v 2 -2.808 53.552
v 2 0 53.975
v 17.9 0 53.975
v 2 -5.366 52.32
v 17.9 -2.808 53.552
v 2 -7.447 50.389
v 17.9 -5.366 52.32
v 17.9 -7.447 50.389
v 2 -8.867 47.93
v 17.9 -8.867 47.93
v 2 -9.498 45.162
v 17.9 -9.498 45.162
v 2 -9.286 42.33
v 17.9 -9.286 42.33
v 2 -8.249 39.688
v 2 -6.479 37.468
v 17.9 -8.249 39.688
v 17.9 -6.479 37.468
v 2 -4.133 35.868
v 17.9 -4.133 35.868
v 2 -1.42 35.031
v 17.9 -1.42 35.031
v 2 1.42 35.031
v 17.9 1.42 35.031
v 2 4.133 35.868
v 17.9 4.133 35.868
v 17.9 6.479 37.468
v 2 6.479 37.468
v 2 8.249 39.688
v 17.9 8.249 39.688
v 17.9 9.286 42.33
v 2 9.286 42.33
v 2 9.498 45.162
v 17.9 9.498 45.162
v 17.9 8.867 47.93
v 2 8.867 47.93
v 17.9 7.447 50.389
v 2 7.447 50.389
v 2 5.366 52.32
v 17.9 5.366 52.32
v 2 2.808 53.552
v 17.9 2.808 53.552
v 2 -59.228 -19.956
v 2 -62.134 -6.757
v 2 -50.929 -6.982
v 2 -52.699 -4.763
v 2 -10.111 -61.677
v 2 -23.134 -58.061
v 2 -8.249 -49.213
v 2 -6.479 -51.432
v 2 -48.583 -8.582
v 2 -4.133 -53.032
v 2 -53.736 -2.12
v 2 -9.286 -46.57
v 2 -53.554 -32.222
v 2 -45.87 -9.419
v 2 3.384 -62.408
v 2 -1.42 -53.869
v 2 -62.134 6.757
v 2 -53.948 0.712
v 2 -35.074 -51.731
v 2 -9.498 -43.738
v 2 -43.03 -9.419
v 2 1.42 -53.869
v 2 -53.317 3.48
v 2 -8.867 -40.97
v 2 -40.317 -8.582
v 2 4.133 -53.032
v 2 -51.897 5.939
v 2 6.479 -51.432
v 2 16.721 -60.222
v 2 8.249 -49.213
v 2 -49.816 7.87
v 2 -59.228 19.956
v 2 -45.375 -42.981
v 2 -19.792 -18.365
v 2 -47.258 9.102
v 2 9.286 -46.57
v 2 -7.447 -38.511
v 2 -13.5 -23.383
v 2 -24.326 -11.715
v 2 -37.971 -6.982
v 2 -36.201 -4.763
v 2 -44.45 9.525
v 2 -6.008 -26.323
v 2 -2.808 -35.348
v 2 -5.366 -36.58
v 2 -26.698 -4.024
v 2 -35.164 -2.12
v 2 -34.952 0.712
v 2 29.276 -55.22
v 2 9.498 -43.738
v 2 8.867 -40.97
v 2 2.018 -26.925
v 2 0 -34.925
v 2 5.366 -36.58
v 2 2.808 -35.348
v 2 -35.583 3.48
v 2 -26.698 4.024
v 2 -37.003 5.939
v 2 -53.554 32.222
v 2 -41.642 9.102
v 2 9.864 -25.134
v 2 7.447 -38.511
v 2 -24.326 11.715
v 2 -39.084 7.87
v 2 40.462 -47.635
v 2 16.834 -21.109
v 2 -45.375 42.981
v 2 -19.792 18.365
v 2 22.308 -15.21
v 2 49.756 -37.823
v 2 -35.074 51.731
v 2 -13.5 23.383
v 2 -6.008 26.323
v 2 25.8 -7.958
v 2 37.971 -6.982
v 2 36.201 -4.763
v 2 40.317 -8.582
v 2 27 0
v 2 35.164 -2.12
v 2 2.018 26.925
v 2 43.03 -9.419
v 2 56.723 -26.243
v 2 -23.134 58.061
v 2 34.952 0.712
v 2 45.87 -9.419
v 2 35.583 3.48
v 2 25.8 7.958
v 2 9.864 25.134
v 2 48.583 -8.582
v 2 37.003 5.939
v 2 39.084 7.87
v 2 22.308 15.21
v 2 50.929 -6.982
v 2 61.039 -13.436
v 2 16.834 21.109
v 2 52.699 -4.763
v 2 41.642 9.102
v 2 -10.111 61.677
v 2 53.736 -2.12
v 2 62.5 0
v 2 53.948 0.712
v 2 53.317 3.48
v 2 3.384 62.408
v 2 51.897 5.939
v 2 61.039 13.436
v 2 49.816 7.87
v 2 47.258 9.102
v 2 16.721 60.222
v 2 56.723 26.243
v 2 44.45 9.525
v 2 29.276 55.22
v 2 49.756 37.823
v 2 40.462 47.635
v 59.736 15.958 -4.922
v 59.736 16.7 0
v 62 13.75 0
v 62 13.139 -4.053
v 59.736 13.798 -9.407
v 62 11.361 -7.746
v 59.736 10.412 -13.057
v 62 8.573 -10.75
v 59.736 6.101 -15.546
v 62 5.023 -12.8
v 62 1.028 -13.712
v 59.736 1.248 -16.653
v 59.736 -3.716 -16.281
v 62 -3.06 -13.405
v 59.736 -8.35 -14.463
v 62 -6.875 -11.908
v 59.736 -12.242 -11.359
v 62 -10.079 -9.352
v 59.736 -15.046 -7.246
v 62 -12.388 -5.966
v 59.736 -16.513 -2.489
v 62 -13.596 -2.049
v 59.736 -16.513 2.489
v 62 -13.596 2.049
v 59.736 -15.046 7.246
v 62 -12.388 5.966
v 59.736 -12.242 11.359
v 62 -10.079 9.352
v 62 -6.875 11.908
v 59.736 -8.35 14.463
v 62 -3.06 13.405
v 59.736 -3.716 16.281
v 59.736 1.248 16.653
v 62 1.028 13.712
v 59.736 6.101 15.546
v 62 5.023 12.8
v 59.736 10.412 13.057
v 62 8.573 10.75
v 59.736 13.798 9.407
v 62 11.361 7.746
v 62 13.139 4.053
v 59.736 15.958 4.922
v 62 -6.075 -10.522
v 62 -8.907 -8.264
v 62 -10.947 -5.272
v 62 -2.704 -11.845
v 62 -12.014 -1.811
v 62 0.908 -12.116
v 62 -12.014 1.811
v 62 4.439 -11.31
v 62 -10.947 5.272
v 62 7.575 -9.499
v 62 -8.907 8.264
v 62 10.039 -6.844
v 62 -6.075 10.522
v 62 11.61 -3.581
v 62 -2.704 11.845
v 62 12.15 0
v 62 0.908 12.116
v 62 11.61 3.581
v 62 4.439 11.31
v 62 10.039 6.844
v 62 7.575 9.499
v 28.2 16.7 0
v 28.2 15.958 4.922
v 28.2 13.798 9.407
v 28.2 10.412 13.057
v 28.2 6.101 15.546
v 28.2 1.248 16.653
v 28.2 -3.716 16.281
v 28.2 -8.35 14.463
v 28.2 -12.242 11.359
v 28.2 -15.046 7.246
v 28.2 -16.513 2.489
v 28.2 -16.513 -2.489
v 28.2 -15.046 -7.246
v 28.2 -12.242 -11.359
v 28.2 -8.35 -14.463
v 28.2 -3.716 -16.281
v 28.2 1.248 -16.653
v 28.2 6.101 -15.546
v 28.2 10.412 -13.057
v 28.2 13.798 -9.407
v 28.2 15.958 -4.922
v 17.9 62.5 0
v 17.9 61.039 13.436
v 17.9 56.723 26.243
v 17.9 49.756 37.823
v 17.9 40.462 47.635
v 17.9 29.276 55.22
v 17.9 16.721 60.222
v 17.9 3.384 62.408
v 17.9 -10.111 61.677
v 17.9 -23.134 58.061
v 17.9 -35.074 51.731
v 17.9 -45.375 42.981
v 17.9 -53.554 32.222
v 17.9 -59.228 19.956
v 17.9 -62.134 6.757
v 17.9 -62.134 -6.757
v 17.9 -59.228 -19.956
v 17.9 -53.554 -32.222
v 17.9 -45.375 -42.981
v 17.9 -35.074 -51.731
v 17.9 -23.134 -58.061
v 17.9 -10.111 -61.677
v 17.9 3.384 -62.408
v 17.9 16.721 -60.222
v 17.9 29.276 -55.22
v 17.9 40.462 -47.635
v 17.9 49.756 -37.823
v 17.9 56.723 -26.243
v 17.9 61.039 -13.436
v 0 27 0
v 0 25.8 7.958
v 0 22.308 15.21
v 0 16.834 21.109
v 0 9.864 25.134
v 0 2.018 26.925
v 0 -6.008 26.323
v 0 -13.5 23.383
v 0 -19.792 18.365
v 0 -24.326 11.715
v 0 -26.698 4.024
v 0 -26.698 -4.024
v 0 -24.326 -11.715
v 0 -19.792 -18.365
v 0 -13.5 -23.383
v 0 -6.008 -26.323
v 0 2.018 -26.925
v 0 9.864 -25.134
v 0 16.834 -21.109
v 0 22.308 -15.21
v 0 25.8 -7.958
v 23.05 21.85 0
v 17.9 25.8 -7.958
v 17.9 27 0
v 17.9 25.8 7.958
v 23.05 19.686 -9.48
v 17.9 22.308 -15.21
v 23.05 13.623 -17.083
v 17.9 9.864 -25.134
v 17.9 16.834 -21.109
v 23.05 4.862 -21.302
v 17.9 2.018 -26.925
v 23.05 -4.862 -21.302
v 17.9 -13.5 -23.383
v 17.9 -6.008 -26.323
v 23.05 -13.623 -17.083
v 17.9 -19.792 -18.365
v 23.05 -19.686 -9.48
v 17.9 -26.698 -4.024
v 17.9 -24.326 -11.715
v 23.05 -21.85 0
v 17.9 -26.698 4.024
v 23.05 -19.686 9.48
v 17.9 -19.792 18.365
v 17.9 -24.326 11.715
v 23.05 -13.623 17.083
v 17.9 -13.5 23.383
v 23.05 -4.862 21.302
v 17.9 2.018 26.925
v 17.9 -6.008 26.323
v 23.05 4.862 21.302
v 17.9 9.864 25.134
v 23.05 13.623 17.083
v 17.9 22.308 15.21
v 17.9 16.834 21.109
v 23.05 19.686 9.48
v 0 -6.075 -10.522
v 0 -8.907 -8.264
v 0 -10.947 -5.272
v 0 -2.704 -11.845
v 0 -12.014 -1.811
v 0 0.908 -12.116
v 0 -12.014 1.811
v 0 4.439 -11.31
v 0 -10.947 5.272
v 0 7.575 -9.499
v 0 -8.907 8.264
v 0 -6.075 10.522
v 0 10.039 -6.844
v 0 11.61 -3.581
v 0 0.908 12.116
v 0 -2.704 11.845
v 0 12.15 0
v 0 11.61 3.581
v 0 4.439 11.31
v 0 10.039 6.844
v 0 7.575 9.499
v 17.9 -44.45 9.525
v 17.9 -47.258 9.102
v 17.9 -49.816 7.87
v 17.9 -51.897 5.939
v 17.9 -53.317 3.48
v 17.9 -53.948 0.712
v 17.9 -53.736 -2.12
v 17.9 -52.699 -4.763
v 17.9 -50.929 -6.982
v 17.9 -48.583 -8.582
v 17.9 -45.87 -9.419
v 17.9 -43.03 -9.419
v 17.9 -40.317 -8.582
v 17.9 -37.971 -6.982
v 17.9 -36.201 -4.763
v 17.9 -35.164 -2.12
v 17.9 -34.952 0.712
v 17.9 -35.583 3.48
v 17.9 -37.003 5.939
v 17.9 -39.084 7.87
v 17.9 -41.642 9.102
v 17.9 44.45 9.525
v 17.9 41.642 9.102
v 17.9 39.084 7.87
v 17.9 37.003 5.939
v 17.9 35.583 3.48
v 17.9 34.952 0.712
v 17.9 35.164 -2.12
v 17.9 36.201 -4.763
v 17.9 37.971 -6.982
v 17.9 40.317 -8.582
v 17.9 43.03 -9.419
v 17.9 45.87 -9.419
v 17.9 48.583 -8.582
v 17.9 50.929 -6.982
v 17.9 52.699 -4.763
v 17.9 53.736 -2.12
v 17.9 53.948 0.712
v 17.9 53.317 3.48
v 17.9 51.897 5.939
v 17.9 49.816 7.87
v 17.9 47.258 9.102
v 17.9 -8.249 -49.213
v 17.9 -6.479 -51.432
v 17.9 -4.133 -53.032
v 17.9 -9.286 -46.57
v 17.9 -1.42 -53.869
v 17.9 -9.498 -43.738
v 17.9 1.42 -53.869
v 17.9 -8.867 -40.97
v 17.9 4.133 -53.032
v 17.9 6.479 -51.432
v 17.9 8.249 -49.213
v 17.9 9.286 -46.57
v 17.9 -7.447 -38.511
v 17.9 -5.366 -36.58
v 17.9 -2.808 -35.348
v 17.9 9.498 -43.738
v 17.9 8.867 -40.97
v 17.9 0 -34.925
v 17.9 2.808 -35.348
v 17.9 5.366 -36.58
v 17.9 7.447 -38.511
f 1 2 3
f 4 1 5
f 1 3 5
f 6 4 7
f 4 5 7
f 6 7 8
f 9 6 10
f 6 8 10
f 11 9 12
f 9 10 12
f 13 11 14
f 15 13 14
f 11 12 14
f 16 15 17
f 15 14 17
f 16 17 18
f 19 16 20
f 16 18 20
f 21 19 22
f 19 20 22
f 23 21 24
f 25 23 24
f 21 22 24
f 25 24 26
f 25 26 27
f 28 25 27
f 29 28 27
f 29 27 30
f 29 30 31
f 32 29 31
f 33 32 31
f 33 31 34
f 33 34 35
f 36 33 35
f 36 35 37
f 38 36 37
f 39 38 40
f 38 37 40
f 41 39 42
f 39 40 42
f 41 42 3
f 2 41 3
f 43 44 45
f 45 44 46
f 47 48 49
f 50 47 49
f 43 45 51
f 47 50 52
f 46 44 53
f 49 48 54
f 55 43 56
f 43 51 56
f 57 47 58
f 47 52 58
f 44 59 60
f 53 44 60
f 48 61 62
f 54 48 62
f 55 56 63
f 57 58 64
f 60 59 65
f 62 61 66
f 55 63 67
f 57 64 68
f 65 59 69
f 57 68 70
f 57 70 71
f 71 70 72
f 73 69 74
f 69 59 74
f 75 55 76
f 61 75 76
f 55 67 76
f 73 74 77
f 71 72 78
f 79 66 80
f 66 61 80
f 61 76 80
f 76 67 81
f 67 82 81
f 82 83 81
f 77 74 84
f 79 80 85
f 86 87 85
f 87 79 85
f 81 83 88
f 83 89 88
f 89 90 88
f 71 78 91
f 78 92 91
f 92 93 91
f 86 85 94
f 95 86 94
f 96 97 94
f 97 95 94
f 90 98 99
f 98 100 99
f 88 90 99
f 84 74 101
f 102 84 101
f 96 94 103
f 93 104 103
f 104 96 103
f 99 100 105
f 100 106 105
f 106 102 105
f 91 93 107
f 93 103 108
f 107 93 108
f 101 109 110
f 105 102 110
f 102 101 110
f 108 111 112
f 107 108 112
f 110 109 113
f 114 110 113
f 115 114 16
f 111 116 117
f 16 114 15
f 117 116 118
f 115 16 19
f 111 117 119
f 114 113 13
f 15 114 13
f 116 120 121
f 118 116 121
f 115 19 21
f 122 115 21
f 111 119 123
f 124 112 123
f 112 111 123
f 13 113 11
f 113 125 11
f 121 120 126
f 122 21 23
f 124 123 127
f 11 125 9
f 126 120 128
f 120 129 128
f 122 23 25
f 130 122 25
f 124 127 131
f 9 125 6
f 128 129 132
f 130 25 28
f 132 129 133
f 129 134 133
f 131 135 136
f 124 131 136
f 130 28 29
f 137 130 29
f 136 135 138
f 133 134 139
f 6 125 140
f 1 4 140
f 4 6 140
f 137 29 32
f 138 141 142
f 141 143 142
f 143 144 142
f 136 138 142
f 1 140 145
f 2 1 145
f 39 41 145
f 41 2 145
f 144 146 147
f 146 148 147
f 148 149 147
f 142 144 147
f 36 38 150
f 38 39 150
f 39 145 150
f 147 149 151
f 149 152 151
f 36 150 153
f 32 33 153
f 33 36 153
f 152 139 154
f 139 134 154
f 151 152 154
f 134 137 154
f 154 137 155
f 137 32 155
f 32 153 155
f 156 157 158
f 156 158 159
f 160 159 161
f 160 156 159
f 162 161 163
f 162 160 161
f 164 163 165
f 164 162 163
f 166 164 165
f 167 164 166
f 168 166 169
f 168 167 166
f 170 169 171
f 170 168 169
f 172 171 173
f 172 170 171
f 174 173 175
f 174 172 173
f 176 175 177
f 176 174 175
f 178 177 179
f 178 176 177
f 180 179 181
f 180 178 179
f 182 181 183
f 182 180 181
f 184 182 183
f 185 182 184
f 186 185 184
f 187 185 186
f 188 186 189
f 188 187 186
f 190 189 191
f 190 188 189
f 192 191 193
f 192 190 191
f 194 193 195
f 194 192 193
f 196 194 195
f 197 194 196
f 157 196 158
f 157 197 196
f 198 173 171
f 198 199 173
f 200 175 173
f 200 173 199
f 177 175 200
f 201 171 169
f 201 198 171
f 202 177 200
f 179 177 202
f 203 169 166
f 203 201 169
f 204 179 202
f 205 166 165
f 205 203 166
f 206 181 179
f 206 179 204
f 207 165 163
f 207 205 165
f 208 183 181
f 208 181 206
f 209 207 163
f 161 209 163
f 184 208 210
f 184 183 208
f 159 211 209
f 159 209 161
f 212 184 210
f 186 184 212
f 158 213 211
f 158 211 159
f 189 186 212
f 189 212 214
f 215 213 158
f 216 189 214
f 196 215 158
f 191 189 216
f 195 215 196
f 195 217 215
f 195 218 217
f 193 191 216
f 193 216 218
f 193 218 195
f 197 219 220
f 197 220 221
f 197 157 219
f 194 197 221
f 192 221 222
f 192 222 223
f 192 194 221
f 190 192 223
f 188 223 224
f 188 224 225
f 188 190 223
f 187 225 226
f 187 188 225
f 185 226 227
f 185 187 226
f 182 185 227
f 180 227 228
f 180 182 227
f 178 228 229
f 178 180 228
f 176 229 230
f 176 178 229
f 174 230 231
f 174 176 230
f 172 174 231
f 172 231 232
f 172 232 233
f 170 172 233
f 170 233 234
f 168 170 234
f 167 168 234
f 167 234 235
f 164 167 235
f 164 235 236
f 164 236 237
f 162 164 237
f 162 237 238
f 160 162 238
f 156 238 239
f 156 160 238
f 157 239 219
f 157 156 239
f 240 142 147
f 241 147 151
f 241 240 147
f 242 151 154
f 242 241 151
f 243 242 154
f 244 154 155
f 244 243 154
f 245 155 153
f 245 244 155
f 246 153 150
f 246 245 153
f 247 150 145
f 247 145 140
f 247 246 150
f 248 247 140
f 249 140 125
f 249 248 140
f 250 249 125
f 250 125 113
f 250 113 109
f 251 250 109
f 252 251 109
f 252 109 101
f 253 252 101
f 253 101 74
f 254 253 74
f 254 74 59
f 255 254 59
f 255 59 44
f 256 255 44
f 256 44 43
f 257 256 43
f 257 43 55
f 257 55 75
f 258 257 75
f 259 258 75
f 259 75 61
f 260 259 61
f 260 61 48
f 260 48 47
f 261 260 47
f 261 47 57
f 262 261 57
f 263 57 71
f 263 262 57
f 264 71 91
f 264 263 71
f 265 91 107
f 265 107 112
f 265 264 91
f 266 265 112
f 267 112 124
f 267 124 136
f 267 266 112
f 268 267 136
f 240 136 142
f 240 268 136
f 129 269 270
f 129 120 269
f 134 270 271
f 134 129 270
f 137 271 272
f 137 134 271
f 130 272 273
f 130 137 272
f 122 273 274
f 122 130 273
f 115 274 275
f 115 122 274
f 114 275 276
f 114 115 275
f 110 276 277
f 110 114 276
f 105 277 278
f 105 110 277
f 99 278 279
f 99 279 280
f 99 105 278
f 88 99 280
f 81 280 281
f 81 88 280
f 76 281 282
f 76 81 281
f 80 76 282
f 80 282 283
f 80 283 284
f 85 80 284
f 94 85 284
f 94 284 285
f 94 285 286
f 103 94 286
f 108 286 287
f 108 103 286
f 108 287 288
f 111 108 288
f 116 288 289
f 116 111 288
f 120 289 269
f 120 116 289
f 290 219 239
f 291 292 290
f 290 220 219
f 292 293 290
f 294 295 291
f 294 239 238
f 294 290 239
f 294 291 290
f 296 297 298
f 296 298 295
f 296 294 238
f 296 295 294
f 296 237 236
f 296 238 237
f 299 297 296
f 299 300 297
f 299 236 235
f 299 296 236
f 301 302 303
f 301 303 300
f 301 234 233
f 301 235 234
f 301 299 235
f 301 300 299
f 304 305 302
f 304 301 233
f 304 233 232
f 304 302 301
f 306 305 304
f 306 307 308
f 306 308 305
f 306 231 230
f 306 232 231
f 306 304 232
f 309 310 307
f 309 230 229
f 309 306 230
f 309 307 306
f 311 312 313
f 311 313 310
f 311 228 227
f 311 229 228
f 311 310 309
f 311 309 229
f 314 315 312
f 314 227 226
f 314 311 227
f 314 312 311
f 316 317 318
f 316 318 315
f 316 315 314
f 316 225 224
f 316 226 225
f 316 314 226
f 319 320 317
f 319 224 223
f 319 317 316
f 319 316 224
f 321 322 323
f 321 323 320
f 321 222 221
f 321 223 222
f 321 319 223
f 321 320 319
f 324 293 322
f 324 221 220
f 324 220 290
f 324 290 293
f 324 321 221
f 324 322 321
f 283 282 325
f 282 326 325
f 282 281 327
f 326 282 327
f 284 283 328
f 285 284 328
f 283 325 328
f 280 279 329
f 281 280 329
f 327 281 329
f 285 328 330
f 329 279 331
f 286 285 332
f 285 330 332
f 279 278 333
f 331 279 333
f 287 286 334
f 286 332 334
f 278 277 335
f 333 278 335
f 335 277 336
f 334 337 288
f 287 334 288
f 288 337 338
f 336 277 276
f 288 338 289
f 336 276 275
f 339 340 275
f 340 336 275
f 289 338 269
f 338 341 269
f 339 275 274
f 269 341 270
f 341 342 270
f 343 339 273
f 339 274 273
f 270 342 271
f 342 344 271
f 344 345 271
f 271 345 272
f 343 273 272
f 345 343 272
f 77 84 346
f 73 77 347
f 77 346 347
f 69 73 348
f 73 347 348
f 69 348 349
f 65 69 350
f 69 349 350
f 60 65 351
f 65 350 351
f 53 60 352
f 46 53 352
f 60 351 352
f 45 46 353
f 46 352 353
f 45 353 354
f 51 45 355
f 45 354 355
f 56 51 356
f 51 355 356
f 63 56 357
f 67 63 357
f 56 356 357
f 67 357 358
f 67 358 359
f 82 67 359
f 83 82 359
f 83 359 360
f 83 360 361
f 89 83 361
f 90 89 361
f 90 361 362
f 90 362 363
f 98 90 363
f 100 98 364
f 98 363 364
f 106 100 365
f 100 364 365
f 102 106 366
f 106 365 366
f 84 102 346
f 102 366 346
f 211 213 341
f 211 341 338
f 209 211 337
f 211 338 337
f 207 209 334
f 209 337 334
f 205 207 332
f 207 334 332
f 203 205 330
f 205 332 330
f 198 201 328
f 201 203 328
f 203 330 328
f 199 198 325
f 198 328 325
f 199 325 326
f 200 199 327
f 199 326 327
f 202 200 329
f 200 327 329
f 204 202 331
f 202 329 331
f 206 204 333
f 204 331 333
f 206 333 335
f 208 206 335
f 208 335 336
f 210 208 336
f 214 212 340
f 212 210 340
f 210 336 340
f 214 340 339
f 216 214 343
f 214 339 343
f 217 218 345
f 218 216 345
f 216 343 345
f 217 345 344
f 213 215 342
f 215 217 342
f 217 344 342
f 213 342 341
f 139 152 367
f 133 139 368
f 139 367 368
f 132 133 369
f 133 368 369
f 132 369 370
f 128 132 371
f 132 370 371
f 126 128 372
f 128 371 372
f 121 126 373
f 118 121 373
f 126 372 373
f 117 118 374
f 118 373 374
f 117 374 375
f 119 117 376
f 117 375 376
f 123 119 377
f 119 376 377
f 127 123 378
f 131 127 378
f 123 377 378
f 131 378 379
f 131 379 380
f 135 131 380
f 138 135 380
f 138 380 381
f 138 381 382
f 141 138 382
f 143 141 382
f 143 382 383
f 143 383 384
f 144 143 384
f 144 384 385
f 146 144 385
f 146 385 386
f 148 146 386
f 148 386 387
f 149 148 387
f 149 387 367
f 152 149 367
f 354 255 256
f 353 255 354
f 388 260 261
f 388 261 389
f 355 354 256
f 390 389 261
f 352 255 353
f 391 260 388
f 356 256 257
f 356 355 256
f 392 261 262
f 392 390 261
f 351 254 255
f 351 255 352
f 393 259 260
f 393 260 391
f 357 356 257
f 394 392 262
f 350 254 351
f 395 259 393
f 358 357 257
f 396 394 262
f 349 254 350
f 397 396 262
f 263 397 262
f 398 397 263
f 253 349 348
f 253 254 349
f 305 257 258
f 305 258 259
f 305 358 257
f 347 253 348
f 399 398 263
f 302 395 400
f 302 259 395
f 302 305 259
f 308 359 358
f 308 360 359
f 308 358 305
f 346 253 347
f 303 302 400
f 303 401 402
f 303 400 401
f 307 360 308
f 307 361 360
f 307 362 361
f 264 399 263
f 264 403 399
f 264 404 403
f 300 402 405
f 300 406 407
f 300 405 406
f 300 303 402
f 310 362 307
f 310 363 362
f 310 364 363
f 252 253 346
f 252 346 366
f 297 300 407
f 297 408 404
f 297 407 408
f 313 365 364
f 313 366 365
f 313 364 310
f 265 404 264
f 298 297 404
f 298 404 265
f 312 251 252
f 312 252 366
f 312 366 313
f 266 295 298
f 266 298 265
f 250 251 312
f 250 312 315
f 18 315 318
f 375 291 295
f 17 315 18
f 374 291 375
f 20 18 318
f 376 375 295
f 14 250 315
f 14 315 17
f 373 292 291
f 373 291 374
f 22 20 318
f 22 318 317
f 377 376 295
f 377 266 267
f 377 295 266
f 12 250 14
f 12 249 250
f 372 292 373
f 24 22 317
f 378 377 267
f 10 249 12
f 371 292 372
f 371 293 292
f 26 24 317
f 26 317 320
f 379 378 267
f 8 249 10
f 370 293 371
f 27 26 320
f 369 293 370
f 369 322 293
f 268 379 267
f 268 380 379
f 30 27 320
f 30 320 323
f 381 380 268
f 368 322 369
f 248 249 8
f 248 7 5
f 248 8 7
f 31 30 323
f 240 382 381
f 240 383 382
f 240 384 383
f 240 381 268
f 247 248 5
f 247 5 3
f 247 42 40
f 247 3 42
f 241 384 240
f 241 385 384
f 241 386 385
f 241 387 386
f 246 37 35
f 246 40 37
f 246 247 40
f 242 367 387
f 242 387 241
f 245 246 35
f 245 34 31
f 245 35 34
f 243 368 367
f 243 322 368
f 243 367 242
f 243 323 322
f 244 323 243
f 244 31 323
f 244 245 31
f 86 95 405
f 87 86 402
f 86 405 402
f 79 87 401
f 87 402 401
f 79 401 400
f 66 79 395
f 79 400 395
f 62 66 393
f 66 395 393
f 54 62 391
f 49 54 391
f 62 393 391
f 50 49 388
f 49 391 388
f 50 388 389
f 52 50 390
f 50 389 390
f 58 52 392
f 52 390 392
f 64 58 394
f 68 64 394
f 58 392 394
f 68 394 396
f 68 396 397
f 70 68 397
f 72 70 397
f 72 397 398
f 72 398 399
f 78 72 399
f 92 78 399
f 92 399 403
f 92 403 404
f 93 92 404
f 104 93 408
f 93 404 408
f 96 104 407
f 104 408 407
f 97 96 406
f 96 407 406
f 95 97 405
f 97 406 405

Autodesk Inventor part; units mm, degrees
ref_plane "YZ Plane" through (0, 0, 0) normal (1, 0, 0) x (0, 1, 0)
ref_plane "XZ Plane" through (0, 0, 0) normal (0, 1, 0) x (-1, 0, 0)
ref_plane "XY Plane" through (0, 0, 0) normal (0, 0, 1) x (1, 0, 0)
sketch "Sketch1" plane through (0, 0, 0) normal (0, 0, 1) x (1, 0, 0)
  line L0 (0, 0) -> (93, 0)
  line L1 (0, 12.15) -> (0, 27)
  line L2 (0, 27) -> (2, 27)
  line L3 (2, 27) -> (2, 62.5)
  line L4 (2, 62.5) -> (17.9, 62.5)
  line L5 (17.9, 62.5) -> (17.9, 27)
  line L6 (17.9, 27) -> (28.2, 16.7)
  line L7 (28.2, 16.7) -> (59.7364, 16.7)
  line L8 (59.7364, 16.7) -> (62, 13.75)
  line L9 (62, 13.75) -> (62, 12.15)
  line L10 (62, 12.15) -> (0, 12.15)
  point P0 (0, 19.575)
  dimension "d5" = 125
  dimension "d6" = 54
  dimension "d7" = 2
  dimension "d8" = 15.9
  dimension "d9" = 45
  dimension "d10" = 60
  dimension "d27" = 37.5
  dimension "d28" = 24.3
  dimension "d29" = 33.4
  dimension "d30" = 1.6
revolve "Revolution1" add sketch "Sketch1" angle 360 about axis through (0, 0, 0) along (1, 0, 0)
sketch "Sketch3" plane through (2, 0, 0) normal (-1, 0, 0) x (0, 0, 1)
  point P0 (0, 0)
  point P1 (0, 44.45)
  dimension "d16" = 44.45
hole "Hole1" at (2, 44.45, 0) direction (1, 0, 0) diameter 19.05 end up to surface
pattern_circular "Circular Pattern1" count 4 over 360 about axis through (9.95, 0, 0) along (1, 0, 0) of "Hole1"
properties part number "Flange 1 in" material "ASTM A105 Gr.B"
